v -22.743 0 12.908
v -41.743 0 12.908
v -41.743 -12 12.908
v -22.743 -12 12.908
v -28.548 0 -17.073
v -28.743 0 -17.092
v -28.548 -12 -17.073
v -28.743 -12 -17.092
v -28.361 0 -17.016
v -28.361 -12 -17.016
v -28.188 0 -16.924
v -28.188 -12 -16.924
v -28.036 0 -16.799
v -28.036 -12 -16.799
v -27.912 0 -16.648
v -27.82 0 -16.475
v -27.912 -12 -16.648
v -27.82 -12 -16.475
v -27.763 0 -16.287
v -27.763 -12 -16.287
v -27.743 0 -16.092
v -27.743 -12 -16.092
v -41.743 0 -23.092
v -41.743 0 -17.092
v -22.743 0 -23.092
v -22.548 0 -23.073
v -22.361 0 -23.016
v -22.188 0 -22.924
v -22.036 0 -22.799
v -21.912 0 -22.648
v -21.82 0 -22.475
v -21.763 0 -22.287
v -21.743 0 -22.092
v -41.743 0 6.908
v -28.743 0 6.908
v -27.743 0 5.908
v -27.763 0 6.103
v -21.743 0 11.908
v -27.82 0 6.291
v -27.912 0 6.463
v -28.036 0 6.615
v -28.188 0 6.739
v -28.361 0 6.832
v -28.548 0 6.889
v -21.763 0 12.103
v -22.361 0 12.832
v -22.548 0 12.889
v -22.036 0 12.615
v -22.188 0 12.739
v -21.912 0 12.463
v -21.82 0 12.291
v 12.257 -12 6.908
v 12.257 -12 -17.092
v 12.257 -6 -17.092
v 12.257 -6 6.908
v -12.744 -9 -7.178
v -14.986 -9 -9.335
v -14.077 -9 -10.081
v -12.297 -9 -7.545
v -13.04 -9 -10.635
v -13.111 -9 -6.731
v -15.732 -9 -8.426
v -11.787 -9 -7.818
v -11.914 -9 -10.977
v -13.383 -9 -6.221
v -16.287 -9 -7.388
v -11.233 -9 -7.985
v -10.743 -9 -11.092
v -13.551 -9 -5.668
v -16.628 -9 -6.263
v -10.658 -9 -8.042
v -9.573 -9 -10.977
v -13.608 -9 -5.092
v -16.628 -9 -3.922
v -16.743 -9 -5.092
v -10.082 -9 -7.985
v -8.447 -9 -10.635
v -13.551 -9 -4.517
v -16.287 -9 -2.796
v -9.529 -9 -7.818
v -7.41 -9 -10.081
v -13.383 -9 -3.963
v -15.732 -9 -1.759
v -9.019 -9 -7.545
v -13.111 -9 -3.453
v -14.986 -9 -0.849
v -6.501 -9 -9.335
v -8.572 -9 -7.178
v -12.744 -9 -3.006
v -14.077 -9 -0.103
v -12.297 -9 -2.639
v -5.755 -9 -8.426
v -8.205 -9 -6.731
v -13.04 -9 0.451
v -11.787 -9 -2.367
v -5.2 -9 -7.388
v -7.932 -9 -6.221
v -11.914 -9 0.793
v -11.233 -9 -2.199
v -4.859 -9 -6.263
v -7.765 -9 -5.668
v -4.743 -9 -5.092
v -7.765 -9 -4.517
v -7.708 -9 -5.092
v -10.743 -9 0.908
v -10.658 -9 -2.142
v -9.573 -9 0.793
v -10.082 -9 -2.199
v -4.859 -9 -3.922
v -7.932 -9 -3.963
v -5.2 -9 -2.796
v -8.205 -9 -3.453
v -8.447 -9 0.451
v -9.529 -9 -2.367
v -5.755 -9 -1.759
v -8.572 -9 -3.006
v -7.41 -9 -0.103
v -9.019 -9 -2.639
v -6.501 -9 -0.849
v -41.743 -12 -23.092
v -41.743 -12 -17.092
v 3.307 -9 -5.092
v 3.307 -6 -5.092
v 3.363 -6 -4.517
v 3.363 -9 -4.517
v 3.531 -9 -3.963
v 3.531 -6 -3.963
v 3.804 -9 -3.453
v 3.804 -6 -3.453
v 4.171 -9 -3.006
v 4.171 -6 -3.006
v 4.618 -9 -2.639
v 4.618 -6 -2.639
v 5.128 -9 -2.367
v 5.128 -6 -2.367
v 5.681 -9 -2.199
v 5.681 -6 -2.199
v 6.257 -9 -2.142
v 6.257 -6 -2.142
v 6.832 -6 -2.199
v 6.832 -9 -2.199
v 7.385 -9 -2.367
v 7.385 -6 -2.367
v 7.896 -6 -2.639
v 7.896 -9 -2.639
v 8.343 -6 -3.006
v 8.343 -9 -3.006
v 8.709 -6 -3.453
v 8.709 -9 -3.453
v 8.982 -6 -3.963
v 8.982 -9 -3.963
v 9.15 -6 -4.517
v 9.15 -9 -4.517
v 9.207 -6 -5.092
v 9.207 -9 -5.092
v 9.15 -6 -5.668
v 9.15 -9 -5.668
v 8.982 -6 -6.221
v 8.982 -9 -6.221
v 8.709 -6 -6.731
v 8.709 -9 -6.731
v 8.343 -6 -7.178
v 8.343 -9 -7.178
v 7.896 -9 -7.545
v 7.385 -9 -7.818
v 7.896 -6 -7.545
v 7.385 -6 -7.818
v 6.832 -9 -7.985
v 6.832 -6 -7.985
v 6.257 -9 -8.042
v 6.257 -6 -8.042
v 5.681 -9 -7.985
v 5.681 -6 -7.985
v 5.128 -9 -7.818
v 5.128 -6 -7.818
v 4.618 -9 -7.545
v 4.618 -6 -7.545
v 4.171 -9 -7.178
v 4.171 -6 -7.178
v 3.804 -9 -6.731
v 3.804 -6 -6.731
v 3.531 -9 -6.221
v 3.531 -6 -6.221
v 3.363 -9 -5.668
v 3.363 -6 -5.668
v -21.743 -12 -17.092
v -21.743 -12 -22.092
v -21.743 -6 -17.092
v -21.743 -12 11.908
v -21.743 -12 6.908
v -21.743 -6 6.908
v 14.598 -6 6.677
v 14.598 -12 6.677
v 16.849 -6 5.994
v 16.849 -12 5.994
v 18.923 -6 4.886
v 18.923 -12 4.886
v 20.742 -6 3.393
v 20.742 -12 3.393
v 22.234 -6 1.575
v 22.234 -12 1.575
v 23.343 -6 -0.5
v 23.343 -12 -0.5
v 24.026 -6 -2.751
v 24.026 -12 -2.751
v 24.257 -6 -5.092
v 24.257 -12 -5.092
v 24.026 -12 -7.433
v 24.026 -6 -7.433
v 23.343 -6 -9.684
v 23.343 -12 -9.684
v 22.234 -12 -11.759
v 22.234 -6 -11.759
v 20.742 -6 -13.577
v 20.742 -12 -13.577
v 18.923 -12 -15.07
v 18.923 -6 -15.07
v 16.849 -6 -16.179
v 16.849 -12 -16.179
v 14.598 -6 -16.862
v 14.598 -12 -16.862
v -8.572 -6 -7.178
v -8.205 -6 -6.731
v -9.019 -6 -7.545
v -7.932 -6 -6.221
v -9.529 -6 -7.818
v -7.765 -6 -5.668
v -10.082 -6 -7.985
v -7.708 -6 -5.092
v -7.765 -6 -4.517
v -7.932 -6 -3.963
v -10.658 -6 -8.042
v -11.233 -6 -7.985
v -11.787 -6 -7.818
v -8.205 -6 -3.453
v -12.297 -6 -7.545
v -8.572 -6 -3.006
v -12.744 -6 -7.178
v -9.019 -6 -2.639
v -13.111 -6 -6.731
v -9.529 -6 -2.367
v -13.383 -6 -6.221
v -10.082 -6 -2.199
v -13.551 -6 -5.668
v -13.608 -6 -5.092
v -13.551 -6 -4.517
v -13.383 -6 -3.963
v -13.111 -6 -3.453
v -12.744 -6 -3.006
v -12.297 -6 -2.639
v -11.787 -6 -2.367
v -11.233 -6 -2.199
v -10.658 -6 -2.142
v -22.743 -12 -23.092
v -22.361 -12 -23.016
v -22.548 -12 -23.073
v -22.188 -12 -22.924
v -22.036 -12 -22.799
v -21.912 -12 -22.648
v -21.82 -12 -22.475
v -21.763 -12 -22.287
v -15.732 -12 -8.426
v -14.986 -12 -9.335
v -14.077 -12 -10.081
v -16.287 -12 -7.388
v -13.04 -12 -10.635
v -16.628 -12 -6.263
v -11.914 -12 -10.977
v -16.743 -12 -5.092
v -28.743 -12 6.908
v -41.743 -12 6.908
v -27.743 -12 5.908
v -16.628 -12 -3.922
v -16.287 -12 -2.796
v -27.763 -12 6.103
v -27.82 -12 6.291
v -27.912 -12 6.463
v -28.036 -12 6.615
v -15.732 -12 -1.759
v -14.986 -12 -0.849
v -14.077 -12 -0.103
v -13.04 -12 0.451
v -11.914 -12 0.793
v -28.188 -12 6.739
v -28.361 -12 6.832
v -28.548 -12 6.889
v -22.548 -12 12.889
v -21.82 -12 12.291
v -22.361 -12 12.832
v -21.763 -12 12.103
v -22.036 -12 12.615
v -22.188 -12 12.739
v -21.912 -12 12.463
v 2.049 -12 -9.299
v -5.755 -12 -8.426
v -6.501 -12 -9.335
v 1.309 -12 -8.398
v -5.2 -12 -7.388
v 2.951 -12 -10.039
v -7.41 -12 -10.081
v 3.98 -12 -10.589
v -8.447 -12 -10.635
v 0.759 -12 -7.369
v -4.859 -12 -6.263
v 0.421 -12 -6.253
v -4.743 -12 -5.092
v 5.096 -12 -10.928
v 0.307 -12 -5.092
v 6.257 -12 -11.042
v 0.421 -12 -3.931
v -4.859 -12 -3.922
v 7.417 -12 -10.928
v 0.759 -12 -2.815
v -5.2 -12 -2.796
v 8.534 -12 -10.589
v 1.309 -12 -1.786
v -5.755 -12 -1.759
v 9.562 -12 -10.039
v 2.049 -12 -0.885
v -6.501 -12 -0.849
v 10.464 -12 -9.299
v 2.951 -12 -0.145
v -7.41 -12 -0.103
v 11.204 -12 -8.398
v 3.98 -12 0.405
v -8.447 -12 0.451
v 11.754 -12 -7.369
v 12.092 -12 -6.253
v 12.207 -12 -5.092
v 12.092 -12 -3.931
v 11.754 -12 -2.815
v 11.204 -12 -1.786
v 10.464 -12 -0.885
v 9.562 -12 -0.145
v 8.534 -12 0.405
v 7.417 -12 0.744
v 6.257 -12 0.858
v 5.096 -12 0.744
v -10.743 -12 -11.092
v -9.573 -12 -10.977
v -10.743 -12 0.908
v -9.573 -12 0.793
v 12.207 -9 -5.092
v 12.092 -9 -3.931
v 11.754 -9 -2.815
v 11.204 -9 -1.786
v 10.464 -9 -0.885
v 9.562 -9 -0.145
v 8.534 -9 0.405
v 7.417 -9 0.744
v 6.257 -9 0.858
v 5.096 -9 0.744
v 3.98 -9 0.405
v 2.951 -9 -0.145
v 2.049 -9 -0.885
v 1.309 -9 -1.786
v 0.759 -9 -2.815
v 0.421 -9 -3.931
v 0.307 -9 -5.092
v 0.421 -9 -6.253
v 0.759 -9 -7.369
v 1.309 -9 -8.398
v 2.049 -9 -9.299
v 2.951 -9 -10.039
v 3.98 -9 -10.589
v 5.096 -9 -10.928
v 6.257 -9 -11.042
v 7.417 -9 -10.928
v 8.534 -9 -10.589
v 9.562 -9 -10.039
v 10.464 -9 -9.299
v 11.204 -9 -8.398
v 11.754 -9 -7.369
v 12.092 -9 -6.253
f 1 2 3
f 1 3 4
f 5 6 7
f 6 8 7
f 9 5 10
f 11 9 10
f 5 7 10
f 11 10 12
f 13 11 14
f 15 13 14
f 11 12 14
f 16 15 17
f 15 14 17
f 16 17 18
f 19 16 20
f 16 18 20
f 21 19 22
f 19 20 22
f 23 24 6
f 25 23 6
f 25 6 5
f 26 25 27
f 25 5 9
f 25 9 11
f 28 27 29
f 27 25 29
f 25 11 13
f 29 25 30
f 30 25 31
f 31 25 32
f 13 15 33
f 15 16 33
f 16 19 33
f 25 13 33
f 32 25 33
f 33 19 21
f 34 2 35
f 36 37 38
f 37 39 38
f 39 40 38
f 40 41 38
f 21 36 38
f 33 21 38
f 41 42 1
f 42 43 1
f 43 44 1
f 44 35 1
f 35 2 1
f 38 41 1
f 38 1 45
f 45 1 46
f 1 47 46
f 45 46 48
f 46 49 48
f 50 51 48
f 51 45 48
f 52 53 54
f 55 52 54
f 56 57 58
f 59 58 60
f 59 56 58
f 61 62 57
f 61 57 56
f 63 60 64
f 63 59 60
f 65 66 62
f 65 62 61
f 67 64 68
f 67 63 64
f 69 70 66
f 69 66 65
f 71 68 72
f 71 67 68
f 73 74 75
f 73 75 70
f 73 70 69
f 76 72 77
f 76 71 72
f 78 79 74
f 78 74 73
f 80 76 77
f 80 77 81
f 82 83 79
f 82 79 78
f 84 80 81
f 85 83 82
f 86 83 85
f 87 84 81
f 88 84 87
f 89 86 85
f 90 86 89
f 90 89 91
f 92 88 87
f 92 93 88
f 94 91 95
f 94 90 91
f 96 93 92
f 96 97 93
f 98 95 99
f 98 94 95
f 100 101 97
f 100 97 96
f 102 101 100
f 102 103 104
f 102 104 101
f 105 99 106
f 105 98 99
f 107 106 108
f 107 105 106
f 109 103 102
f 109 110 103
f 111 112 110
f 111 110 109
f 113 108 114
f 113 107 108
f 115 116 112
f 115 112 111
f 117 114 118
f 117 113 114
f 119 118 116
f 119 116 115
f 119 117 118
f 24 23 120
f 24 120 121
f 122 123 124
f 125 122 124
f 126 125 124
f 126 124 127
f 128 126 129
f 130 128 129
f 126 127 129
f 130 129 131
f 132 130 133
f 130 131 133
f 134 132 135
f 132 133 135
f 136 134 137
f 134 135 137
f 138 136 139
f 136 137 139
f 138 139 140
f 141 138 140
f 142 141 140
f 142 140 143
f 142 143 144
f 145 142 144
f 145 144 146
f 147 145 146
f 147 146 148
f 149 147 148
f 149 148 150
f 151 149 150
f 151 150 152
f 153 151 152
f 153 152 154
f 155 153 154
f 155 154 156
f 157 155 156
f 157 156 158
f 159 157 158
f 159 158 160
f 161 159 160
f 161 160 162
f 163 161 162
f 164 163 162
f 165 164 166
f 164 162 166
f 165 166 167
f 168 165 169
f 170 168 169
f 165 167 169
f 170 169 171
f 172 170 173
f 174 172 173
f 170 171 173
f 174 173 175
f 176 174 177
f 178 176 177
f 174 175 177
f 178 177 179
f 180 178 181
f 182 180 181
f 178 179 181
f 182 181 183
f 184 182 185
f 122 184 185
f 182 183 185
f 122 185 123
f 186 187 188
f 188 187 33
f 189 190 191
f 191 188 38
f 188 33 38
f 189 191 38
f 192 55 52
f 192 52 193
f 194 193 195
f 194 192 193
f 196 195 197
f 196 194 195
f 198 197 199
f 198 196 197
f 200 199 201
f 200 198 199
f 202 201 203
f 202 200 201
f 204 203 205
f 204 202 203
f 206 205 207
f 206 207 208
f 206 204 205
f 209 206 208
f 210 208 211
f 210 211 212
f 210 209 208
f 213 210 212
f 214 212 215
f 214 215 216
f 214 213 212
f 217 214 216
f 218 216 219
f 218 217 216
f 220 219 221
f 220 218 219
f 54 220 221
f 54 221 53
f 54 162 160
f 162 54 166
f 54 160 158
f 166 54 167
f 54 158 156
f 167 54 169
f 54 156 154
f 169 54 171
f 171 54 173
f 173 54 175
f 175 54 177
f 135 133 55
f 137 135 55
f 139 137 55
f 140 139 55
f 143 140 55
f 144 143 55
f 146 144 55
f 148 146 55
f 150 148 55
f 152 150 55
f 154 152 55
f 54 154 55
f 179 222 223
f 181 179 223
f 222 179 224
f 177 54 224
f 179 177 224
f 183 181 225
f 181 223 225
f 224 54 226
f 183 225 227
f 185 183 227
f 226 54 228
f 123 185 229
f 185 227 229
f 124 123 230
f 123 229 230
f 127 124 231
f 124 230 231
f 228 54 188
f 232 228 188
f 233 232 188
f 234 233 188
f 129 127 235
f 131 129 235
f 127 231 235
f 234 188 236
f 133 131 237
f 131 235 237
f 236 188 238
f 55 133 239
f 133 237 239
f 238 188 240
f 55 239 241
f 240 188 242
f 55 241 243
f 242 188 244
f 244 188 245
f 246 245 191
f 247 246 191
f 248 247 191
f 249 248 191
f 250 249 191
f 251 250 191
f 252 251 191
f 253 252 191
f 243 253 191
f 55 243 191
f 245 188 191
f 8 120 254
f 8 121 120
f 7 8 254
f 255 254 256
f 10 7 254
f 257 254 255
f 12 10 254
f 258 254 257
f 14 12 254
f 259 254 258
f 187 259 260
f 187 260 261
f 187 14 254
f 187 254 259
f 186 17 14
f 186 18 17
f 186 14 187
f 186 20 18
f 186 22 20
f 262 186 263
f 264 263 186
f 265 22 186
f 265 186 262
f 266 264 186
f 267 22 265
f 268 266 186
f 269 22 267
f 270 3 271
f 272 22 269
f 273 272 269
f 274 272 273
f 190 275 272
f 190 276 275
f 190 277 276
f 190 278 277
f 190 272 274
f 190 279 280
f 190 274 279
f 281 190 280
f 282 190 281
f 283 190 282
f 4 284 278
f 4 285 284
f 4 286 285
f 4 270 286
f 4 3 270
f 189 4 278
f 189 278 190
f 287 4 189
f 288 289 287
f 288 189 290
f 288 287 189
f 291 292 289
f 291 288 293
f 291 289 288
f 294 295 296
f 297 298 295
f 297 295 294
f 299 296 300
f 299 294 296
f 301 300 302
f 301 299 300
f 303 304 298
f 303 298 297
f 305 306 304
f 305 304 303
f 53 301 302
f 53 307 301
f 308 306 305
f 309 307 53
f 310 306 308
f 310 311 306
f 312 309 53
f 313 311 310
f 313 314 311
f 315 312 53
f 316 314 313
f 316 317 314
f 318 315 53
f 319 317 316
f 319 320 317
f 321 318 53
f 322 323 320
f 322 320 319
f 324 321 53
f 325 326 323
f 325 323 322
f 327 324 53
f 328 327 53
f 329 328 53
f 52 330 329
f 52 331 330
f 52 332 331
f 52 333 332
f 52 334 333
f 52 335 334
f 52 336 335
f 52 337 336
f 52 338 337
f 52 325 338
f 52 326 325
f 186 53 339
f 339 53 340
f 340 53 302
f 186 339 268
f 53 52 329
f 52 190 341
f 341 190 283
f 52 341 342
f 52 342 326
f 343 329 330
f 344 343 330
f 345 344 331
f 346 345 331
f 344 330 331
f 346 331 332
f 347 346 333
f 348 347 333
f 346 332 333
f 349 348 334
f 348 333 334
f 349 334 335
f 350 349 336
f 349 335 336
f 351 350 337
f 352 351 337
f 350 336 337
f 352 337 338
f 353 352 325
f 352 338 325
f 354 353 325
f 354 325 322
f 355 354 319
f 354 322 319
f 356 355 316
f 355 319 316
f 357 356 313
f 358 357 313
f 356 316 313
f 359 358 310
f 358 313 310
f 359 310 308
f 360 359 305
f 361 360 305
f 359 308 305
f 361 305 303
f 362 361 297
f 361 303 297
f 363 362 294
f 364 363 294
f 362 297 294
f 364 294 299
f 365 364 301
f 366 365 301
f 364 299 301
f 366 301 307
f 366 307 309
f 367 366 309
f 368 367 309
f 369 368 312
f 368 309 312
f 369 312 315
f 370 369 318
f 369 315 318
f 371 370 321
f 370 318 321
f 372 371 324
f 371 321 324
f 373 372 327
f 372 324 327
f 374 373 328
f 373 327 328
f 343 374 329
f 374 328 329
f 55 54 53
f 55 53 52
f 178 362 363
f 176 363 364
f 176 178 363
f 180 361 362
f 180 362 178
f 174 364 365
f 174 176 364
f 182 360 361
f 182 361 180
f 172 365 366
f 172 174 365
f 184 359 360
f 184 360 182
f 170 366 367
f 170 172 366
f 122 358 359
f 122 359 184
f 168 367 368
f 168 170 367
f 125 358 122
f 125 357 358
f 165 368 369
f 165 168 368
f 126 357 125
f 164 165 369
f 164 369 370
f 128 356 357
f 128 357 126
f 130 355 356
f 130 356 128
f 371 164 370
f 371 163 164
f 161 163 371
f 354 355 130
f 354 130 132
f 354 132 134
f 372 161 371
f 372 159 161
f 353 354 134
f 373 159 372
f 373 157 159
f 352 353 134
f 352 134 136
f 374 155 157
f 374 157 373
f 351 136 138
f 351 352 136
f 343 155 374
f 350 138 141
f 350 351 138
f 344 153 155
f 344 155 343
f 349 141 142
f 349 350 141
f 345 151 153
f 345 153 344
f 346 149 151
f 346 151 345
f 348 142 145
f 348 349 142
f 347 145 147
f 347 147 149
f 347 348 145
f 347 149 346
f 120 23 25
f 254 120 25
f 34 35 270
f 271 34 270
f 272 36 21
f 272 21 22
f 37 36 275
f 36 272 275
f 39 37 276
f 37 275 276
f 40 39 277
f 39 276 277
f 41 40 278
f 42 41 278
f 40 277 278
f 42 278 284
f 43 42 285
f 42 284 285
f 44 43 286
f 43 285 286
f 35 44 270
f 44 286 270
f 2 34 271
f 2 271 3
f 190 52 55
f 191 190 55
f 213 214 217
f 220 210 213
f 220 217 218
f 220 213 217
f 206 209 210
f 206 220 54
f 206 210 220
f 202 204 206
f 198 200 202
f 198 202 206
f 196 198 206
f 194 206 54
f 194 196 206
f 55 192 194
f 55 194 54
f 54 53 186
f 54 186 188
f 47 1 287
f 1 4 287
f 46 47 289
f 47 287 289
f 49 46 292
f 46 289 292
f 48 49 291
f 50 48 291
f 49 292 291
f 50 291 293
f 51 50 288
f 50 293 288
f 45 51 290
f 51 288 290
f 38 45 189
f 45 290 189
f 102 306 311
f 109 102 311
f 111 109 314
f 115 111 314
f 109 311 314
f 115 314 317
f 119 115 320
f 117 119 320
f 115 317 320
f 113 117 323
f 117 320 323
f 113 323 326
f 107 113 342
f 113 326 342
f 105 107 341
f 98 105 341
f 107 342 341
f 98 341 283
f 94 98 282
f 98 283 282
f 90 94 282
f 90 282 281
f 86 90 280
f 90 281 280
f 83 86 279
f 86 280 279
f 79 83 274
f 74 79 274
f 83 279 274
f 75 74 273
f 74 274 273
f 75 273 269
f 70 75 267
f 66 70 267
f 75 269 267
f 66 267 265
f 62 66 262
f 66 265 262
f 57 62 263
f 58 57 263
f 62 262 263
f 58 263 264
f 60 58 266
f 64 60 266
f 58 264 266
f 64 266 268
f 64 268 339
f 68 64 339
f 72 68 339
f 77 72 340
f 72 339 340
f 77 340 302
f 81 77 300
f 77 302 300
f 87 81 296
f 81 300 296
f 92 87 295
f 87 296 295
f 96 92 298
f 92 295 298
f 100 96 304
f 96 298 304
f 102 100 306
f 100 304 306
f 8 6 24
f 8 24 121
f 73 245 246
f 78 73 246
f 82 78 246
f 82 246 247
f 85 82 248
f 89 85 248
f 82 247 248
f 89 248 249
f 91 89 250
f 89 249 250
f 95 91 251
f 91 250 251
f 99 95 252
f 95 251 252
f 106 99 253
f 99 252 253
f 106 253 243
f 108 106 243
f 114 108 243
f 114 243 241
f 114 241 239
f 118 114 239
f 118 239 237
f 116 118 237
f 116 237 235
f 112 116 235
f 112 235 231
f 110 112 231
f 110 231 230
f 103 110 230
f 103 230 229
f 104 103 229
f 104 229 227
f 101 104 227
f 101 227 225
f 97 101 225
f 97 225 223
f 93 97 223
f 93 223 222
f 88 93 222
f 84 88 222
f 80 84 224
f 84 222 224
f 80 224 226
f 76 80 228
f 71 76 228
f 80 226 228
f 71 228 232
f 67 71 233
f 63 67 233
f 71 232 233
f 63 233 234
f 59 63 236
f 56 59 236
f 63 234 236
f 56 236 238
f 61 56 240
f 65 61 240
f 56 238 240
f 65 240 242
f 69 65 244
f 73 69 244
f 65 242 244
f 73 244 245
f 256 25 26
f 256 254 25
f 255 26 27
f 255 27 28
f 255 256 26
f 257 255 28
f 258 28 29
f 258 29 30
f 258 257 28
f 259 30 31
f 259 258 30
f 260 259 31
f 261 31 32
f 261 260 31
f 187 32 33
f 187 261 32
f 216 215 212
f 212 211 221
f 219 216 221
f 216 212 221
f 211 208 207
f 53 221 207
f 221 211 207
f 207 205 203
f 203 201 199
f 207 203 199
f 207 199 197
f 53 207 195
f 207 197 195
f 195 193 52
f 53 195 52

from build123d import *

# Parameters (mm, degrees)
F0_W      = 20
F0_H      = 36
F1_DEPTH  = 12
F2_W      = 12
F2_H      = 24
F3_DEPTH  = 14
F4_W      = 6
F4_H      = 23.901319
F5_DEPTH  = 34
F7_W      = 6
F7_H      = 24
F8_DEPTH  = 34
F10_DEPTH = 6
F11_R     = 6
F12_DEPTH = 3
F14_DEPTH = 3
F16_D     = 5.9
F17_R     = 1


with BuildPart() as f1:
    # F0 (on Front) → F1 (new body)
    with BuildSketch(Plane.XZ):
        with Locations((-31.743424, -5.092108)):
            Rectangle(F0_W, F0_H)
    extrude(amount=F1_DEPTH)

    # F2 (on face) → F3 (cut)
    with BuildSketch(Plane(origin=(-41.743424, 0, 0), x_dir=(0, -1, 0), z_dir=(-1, 0, 0))):
        with Locations((6, -5.092108)):
            Rectangle(F2_W, F2_H)
    extrude(amount=-F3_DEPTH, mode=Mode.SUBTRACT)

    # F7 (on face) → F8 (join)
    with BuildSketch(Plane.YZ.offset(-21.743424)):
        with Locations((-9, -5.092108)):
            Rectangle(F7_W, F7_H)
    extrude(amount=F8_DEPTH)

    # F11 (on face) → F12 (cut)
    with BuildSketch(Plane.XZ.offset(12)):
        with Locations((-10.743424, -5.092108)):
            Circle(F11_R)
    extrude(amount=-F12_DEPTH, mode=Mode.SUBTRACT)

    # F13 (on face) → F14 (cut)
    with BuildSketch(Plane.XZ.offset(12)):
        with BuildLine():
            ThreePointArc((0.306576, -5.092108), (6.256576, -11.042108), (12.206576, -5.092108))
            ThreePointArc((12.206576, -5.092108), (6.256576, 0.857892), (0.306576, -5.092108))
        make_face()
    extrude(amount=-F14_DEPTH, mode=Mode.SUBTRACT)

    # F16 (through all)
    with Locations(Plane.XZ.offset(9)):
        with Locations((6.256576, -5.092108), (-10.657895, -5.092108)):
            Hole(F16_D / 2)

    # F17
    f17_edges = [f1.edges().sort_by_distance(p)[0] for p in [
        (-27.743424, -6, 6.907892),
        (-27.743424, -6, -17.092108),
        (-21.743424, -6, 12.907892),
        (-21.743424, -6, -23.092108),
    ]]
    fillet(f17_edges, radius=F17_R)


with BuildPart() as f5:
    # F4 (on Right) → F5 (new body)
    with BuildSketch(Plane.YZ):
        with Locations((-9.138158, -5.141449)):
            Rectangle(F4_W, F4_H)
    extrude(amount=F5_DEPTH)


with BuildPart() as f10:
    # F9 (on face) → F10 (new body)
    with BuildSketch(Plane(origin=(0, -6, 0), x_dir=(-1, 0, 0), z_dir=(0, 1, 0))):
        with BuildLine():
            Line((-12.256576, -17.092108), (-12.256576, 6.907892))
            ThreePointArc((-12.256576, 6.907892), (-24.256576, -5.092108), (-12.256576, -17.092108))
        make_face()
    extrude(amount=-F10_DEPTH)


solid = Compound([f1.part, f10.part])
